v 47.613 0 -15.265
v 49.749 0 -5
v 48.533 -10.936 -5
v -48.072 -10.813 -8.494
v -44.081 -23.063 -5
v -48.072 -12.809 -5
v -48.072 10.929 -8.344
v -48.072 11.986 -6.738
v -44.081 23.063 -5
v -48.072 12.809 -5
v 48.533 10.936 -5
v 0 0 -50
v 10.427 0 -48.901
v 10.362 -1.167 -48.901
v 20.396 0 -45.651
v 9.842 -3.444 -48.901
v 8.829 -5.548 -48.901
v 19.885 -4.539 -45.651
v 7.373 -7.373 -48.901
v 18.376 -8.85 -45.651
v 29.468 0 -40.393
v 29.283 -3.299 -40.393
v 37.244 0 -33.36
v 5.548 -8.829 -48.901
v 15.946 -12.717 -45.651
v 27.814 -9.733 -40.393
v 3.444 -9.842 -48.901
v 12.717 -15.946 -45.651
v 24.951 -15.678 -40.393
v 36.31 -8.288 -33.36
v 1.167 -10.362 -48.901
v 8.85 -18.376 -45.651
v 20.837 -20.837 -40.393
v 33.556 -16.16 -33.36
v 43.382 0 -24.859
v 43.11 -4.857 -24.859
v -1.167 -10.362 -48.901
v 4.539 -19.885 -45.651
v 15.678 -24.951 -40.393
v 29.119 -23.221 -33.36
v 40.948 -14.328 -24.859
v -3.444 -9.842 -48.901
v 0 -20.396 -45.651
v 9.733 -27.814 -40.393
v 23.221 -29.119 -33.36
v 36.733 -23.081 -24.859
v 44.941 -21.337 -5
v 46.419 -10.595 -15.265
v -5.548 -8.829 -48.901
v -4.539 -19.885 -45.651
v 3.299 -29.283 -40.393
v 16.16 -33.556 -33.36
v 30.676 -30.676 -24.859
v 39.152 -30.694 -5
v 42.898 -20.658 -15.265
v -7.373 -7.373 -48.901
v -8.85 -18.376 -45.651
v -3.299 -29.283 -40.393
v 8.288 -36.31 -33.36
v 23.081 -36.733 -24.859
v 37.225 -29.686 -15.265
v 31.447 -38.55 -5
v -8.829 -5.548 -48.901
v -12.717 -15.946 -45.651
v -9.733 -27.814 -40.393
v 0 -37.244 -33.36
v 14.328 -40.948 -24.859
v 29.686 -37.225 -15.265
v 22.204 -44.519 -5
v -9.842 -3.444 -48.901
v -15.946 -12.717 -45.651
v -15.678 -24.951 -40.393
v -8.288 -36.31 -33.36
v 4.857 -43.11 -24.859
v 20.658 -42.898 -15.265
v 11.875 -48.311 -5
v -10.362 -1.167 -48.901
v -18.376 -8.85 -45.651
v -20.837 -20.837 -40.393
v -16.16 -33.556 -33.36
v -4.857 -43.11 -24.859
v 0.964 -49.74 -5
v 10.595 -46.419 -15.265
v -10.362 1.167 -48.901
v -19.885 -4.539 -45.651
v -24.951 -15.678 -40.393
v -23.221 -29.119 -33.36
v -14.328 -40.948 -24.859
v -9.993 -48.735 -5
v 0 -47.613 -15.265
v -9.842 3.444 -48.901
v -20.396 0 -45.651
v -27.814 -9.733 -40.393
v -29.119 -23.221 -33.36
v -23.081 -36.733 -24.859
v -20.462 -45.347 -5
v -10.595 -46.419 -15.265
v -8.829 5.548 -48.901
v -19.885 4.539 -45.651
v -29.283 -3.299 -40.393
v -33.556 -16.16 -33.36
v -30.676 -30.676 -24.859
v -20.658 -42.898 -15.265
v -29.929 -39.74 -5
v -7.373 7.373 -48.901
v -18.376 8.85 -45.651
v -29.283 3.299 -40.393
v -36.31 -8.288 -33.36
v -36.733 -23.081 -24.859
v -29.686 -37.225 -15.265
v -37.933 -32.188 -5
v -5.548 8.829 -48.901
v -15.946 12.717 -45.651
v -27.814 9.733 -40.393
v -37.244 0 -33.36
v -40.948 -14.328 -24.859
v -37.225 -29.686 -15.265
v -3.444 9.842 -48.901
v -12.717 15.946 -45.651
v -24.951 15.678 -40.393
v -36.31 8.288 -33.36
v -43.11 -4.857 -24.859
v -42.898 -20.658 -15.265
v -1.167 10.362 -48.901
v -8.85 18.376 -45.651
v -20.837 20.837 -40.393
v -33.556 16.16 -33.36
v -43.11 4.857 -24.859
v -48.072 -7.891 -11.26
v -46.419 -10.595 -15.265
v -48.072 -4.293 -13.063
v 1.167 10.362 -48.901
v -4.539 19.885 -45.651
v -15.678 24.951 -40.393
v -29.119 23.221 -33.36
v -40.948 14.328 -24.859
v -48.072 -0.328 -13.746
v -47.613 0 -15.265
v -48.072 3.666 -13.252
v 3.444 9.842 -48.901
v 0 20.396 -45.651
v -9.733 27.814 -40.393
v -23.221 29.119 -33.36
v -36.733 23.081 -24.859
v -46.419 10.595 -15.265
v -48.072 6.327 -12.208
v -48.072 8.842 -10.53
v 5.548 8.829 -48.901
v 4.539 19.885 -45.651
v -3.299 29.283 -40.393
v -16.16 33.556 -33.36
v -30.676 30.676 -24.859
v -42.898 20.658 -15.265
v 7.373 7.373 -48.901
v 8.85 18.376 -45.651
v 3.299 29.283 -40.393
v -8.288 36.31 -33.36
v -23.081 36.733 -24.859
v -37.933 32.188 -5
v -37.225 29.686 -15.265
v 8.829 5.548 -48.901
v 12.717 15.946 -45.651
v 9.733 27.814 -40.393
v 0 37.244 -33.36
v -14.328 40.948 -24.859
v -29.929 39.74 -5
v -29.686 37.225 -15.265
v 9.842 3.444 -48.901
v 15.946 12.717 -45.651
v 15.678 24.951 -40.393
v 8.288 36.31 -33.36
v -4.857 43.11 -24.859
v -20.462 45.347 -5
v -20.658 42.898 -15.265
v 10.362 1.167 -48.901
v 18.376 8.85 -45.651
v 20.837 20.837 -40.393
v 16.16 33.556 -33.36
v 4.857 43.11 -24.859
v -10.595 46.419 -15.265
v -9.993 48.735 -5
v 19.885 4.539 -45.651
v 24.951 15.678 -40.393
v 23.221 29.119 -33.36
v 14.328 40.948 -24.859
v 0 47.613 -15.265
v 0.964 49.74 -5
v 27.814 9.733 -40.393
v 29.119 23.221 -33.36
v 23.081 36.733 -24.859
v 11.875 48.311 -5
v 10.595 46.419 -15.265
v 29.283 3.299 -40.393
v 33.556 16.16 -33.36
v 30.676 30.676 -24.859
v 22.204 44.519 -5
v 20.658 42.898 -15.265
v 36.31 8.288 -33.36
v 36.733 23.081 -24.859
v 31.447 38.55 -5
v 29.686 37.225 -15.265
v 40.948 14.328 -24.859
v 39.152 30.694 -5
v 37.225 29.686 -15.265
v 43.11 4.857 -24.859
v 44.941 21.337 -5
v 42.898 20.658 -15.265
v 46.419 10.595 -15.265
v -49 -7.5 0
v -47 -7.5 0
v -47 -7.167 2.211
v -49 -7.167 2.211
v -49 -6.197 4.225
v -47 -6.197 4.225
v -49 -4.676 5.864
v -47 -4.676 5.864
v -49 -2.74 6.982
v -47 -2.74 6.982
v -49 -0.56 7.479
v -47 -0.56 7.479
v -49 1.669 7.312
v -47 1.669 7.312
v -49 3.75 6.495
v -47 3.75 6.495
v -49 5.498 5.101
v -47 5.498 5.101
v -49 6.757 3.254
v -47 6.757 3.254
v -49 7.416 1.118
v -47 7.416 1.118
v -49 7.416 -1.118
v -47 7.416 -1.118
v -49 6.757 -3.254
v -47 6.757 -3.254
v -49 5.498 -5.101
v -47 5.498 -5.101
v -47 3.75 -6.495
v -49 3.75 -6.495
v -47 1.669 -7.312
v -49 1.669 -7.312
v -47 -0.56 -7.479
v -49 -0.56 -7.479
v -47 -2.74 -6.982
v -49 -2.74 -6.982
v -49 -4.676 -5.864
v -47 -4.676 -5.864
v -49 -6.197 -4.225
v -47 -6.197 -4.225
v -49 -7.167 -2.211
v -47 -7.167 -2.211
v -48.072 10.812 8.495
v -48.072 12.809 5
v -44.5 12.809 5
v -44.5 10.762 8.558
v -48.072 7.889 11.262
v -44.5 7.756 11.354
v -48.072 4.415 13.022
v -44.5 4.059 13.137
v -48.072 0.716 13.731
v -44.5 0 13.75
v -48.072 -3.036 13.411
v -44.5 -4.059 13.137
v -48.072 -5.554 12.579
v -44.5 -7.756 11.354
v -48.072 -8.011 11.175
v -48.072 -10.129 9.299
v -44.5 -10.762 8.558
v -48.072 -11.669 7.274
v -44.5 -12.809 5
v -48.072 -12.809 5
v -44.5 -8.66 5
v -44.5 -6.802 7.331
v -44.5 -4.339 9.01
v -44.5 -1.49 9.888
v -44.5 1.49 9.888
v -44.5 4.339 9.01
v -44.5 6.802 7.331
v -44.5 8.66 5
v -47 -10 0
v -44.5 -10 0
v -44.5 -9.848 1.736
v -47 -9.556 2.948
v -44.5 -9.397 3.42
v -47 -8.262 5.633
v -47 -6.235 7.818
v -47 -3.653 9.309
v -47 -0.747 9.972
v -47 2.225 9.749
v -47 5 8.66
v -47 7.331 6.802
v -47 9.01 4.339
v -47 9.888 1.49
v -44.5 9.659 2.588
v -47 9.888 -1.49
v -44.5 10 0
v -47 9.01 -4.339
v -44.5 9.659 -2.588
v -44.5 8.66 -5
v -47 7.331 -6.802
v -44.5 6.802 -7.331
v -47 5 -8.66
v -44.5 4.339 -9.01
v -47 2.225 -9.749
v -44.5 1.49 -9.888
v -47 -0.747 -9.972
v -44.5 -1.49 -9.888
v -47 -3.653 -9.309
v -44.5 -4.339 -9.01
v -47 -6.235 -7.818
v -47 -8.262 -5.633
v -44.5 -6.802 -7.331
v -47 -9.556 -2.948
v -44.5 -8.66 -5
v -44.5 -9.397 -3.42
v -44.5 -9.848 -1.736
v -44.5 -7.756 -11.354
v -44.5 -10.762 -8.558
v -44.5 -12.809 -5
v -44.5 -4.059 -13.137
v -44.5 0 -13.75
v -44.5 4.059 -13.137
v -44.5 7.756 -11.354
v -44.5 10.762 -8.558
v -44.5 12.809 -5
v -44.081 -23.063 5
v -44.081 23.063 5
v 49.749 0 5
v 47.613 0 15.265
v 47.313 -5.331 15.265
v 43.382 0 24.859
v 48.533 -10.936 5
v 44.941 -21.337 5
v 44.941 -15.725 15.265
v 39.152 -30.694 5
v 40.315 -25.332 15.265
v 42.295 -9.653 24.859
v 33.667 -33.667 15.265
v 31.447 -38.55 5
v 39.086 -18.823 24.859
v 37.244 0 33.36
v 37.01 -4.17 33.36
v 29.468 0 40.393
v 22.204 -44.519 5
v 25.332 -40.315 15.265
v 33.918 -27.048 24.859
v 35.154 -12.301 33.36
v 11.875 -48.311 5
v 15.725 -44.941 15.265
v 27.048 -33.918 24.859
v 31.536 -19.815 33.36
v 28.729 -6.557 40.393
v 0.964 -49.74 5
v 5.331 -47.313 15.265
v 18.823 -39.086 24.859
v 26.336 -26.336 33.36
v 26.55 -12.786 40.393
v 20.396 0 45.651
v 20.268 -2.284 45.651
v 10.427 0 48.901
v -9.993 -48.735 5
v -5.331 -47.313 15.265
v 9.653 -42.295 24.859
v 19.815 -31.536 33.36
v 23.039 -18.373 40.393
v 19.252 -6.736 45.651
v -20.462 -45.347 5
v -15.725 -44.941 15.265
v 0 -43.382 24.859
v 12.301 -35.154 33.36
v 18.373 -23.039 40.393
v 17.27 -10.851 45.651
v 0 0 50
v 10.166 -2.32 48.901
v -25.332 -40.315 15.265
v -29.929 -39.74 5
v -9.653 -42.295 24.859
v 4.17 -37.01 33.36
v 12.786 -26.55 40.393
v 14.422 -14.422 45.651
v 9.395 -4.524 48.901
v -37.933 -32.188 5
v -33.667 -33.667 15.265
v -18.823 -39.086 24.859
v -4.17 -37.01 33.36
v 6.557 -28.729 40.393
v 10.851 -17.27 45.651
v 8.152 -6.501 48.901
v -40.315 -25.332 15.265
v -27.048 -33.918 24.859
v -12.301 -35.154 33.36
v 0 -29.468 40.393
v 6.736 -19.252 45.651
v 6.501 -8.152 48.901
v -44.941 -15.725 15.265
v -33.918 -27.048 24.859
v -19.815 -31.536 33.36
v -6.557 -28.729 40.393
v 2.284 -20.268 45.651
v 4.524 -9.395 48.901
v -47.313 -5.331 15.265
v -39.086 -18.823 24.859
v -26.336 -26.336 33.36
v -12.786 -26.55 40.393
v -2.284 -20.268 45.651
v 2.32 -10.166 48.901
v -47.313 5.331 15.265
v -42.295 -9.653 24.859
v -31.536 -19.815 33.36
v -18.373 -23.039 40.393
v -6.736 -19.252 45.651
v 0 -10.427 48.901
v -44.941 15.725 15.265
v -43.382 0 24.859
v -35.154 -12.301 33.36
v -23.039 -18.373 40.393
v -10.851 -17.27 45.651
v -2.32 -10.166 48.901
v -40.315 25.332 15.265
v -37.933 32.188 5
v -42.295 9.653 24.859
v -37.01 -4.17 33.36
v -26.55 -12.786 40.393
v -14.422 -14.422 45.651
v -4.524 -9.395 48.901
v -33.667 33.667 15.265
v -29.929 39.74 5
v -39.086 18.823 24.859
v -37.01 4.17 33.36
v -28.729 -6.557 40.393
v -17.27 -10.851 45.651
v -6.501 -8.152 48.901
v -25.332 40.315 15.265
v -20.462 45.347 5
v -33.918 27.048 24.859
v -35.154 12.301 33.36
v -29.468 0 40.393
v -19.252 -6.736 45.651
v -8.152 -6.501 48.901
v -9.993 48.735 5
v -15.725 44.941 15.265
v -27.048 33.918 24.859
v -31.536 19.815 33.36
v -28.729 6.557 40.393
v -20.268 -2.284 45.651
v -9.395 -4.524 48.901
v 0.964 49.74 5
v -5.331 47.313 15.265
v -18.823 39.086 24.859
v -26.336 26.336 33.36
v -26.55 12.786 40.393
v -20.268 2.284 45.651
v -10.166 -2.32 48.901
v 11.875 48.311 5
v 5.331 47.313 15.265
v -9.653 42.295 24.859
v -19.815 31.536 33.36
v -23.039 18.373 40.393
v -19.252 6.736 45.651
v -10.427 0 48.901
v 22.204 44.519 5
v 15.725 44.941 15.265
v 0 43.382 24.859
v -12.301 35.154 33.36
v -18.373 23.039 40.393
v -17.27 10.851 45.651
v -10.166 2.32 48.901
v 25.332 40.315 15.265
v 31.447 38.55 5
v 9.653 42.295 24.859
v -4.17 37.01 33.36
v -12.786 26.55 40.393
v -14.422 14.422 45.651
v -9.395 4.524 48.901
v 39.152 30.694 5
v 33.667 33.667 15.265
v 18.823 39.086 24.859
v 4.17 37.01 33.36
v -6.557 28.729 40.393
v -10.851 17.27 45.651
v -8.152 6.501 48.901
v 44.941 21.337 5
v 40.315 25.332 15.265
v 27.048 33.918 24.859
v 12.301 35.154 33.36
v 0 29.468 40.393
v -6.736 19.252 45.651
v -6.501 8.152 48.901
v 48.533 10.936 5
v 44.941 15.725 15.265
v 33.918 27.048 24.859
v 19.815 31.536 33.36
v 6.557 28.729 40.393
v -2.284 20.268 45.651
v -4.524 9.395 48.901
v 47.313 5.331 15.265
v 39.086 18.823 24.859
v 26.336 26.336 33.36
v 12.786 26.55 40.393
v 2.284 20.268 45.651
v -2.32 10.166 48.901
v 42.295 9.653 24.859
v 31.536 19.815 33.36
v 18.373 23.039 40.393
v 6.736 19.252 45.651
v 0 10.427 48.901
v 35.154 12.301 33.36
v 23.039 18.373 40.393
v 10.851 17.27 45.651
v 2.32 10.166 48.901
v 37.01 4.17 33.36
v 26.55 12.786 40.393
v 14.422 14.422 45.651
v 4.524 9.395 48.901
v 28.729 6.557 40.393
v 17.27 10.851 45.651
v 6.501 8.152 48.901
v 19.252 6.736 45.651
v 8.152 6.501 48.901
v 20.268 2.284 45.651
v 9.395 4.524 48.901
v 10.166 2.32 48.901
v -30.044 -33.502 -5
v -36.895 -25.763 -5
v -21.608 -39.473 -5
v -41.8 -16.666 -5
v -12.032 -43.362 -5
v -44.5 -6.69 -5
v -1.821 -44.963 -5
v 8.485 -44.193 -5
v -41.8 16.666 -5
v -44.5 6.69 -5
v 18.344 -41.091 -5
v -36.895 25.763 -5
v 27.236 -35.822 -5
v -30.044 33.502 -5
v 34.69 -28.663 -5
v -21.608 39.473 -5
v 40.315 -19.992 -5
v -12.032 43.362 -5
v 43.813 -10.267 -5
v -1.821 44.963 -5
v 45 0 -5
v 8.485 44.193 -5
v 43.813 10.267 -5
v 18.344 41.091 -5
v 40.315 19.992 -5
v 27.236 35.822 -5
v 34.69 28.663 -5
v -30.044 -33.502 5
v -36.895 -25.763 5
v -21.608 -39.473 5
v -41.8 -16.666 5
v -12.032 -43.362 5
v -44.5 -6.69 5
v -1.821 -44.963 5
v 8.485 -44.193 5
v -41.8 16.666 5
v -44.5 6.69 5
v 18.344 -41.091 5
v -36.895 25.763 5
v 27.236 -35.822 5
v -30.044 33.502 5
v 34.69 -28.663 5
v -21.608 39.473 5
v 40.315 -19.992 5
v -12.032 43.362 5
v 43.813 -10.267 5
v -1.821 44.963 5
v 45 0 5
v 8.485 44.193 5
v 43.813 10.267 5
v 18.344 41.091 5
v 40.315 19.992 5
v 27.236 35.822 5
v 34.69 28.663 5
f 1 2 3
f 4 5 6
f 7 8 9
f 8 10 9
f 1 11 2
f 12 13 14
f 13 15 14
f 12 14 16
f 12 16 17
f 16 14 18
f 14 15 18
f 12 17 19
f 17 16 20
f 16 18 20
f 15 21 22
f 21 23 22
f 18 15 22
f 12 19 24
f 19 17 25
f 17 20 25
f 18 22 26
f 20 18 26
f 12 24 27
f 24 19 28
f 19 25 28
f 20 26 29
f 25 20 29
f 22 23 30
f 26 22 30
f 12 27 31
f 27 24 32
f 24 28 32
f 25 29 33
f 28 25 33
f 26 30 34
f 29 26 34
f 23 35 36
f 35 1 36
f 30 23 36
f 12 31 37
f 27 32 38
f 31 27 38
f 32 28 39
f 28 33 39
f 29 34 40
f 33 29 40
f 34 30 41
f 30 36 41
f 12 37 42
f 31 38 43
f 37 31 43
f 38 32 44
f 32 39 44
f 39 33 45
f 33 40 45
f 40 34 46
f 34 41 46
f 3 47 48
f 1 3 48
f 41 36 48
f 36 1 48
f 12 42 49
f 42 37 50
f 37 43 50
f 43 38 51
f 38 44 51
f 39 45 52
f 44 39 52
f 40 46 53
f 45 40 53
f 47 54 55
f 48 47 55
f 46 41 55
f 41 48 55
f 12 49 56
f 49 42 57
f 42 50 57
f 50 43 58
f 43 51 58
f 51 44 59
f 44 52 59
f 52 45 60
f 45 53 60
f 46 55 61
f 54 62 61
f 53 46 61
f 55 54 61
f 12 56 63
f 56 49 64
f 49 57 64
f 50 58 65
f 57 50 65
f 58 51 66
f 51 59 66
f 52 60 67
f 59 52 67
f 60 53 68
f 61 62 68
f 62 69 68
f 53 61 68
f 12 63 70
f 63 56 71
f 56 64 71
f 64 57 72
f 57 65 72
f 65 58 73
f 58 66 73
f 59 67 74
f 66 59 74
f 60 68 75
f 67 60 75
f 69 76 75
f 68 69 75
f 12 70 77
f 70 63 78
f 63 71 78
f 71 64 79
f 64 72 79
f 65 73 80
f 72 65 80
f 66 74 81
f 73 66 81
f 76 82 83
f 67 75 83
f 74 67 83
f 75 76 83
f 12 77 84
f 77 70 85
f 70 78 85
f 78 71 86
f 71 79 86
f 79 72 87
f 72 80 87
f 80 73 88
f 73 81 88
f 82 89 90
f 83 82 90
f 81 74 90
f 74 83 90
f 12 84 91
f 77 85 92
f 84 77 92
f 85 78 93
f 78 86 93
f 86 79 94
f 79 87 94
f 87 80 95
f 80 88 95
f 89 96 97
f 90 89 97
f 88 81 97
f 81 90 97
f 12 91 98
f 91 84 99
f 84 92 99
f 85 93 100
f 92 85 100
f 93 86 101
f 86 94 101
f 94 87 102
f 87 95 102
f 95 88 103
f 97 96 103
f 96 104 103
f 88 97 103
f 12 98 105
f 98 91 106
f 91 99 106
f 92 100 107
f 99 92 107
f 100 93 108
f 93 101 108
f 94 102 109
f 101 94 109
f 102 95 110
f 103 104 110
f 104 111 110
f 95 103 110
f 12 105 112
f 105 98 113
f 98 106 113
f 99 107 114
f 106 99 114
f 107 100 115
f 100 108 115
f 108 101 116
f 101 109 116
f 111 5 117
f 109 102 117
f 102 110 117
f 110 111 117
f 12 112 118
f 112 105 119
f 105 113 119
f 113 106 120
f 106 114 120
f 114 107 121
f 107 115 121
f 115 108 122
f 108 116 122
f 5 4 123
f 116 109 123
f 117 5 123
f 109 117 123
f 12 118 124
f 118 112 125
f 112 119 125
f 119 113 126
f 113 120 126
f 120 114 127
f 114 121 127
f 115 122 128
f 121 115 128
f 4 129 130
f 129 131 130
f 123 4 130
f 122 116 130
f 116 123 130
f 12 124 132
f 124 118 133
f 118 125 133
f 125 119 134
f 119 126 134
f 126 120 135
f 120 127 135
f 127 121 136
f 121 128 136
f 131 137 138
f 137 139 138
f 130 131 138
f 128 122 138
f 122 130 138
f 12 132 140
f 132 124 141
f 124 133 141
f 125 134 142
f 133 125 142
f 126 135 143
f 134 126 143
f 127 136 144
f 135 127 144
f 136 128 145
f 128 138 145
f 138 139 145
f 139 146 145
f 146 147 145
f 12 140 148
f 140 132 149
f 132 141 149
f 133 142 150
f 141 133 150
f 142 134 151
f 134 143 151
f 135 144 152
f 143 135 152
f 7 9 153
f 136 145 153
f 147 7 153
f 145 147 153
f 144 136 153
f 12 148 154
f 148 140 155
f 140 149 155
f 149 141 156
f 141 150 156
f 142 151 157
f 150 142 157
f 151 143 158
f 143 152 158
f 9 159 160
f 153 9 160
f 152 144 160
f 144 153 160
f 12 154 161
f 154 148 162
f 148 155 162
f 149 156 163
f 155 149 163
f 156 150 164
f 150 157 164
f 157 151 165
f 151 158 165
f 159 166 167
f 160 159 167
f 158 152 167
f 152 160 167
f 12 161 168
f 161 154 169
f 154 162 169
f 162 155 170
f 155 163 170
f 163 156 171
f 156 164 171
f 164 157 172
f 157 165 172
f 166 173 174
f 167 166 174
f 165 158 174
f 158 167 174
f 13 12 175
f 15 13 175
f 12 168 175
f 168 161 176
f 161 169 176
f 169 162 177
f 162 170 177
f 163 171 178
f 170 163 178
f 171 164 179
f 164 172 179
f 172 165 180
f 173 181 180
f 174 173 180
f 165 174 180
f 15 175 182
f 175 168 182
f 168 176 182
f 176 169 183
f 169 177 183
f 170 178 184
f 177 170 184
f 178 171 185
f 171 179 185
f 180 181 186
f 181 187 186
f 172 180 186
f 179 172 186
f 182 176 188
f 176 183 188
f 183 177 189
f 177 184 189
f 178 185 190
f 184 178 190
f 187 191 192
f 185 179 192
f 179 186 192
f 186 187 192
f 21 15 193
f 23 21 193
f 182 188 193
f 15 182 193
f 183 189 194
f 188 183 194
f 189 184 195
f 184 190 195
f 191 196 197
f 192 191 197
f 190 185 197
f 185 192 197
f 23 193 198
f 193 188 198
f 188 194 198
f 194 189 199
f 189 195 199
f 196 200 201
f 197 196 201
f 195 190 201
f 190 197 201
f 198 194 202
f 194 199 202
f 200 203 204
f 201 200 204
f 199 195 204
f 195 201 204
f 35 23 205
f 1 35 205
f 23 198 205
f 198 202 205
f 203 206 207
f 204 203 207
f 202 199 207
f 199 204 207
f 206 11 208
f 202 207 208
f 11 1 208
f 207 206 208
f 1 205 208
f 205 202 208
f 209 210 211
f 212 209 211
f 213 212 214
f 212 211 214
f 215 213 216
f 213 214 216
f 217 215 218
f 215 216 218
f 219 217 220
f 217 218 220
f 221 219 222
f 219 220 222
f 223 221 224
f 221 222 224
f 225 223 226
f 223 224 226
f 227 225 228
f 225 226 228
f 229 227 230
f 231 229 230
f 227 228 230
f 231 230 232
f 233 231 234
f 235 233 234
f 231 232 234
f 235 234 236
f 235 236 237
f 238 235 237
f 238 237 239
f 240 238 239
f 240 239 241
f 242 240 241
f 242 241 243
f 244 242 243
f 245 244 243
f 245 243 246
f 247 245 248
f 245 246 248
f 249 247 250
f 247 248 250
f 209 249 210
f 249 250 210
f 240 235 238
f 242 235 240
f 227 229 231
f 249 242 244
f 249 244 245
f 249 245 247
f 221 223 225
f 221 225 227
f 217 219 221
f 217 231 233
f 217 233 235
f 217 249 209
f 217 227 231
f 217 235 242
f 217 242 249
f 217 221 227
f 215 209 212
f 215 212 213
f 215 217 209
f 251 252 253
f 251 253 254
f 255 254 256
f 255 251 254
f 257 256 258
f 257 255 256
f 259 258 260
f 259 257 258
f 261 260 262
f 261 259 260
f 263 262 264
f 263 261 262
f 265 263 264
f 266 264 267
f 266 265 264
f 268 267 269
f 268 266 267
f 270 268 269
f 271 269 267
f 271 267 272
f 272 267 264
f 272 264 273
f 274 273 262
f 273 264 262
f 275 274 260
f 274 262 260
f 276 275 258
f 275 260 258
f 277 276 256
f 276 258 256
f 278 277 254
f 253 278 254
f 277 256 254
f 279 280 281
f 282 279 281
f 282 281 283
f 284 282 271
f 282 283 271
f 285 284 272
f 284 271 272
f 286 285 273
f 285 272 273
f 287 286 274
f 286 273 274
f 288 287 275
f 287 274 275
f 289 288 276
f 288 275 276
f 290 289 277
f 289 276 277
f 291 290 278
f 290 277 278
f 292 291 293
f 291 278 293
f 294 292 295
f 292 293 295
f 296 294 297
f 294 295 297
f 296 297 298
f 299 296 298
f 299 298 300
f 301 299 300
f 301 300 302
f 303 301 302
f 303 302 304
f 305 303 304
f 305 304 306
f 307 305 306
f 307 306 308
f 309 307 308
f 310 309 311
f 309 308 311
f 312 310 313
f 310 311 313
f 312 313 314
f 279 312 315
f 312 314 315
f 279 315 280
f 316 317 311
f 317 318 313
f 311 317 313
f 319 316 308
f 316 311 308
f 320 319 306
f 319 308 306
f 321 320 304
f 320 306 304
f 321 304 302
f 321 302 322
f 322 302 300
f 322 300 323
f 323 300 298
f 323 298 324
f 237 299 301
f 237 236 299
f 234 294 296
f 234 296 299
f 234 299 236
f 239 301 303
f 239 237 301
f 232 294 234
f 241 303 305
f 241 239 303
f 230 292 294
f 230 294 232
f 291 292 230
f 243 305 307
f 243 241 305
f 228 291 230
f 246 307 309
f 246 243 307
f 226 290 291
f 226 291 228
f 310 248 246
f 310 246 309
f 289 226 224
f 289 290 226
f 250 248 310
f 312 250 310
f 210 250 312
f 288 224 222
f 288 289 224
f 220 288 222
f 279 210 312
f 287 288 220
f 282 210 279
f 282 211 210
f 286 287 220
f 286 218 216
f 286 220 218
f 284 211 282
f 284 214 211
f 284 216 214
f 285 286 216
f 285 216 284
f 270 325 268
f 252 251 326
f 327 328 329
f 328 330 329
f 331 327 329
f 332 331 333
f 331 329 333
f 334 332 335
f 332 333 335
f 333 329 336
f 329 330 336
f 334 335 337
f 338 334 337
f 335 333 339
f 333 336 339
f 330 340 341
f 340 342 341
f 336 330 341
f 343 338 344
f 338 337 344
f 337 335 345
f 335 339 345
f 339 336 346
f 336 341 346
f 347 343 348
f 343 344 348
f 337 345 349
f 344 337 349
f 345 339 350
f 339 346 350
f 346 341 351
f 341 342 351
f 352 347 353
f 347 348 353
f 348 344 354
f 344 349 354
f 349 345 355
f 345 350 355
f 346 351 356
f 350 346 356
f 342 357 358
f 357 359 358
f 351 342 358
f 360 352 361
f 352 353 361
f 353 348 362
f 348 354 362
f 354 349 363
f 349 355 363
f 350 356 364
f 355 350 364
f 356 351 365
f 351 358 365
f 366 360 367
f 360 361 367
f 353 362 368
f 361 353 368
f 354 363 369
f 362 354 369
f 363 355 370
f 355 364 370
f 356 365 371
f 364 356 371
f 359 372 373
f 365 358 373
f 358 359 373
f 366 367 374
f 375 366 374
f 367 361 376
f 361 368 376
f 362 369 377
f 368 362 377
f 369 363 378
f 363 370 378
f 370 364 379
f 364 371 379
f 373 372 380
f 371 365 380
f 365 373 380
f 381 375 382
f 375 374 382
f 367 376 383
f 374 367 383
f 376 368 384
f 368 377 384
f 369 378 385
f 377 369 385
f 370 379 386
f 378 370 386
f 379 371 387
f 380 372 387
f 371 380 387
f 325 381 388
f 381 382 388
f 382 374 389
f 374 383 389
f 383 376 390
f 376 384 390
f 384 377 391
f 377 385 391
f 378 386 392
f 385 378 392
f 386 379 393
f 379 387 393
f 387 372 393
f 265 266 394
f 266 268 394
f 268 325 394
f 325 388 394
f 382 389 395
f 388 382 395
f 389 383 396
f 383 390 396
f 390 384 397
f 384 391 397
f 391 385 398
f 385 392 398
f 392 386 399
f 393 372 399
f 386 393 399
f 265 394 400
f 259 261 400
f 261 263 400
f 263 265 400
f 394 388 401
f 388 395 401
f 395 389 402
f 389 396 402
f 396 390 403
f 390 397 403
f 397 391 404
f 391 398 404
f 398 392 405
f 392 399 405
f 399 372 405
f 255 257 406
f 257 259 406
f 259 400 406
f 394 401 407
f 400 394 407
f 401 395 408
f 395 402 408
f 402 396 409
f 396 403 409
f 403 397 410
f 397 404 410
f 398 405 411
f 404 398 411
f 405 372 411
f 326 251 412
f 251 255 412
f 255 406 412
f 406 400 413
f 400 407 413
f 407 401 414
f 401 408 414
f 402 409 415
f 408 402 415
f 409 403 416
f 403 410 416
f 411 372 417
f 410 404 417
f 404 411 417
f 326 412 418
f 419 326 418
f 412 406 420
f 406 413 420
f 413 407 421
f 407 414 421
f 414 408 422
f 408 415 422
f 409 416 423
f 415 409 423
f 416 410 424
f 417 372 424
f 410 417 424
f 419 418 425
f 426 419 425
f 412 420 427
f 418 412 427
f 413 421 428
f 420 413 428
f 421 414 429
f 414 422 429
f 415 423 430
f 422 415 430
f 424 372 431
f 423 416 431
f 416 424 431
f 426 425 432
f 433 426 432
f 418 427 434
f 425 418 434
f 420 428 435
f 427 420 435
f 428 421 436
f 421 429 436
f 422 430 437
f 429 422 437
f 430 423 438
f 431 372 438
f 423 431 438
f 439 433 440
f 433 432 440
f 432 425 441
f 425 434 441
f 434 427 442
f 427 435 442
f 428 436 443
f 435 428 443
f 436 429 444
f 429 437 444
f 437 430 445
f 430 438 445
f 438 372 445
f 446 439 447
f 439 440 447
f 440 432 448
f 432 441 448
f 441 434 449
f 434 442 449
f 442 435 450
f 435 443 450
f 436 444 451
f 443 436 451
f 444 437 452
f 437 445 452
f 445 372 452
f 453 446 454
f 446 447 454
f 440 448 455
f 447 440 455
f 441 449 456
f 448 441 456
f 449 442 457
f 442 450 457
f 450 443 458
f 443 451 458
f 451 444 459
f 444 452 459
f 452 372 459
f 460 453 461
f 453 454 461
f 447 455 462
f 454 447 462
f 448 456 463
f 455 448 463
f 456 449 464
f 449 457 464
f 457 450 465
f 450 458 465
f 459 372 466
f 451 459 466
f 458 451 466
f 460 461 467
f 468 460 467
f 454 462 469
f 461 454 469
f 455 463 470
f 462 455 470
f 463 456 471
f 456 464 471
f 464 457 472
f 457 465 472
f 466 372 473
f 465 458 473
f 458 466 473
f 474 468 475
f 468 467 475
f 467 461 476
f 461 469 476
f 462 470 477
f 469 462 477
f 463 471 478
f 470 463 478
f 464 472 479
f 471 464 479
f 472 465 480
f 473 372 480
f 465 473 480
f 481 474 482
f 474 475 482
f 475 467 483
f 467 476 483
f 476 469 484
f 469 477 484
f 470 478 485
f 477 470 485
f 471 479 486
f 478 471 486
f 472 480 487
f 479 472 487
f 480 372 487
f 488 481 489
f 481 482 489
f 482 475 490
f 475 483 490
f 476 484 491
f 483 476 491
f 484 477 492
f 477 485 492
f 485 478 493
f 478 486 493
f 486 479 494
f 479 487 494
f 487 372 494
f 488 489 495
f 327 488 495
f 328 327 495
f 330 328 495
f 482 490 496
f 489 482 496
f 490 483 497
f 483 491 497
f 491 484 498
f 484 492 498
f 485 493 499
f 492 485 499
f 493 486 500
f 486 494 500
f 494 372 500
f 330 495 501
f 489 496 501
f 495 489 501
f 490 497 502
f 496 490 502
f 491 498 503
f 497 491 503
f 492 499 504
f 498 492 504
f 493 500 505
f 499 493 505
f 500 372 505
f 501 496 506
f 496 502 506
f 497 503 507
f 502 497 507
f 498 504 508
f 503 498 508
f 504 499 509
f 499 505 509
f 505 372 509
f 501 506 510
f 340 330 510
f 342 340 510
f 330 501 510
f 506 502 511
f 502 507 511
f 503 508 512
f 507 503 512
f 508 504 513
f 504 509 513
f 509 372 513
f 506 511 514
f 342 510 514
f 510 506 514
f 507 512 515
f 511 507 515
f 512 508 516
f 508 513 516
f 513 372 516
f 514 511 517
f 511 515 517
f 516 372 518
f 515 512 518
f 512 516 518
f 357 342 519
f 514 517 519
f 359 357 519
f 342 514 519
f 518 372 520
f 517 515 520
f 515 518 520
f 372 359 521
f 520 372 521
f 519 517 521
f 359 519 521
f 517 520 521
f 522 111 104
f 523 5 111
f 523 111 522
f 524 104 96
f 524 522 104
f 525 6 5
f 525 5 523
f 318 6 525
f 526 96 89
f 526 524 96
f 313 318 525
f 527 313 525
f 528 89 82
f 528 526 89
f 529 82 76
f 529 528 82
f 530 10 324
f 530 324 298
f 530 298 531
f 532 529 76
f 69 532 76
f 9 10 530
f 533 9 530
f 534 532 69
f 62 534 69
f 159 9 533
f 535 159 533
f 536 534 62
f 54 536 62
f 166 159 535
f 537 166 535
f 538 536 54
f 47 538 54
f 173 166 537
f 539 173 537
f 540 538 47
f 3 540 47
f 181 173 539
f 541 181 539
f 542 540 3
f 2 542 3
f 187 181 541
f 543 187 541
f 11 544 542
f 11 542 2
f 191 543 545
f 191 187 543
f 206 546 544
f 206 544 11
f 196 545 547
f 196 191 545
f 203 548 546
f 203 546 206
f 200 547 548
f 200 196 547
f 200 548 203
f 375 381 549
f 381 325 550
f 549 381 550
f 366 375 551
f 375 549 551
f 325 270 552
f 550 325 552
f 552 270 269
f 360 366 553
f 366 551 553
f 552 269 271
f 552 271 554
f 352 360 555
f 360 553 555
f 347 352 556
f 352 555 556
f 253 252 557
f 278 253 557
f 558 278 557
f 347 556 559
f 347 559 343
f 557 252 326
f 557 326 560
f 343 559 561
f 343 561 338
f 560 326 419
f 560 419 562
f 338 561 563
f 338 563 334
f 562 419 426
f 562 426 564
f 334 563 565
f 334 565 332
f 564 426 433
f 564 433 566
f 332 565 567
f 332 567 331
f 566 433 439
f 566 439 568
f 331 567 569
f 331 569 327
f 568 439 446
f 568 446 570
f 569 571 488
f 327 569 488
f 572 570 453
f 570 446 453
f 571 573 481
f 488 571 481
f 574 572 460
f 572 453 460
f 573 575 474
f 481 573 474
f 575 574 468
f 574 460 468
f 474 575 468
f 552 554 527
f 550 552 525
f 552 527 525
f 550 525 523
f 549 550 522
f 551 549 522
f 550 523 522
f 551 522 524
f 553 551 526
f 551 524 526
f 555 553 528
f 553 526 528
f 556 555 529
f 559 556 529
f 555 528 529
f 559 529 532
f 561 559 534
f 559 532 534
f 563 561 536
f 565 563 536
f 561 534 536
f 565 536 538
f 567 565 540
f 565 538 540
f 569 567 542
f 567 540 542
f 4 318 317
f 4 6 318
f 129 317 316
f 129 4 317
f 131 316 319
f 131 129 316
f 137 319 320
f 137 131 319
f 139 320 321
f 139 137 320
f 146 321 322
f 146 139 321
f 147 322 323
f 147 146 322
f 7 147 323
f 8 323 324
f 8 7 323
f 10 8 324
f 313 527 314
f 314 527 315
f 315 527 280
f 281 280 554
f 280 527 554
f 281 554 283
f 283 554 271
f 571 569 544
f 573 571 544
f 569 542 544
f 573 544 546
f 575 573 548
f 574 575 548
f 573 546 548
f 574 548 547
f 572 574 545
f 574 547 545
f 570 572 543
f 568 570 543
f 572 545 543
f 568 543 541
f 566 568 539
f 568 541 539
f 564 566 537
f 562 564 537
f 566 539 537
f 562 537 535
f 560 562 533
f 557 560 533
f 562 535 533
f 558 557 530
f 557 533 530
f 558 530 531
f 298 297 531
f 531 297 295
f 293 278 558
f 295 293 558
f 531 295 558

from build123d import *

# Parameters (mm, degrees)
F2_R      = 50
F2_R_2    = 45
F3_DEPTH  = 5
F5_R      = 13.75
F6_DEPTH  = 5.5
F7_R      = 10
F8_DEPTH  = 2.5
F9_R      = 7.5
F10_DEPTH = 2


with BuildPart() as f1:
    # F0 (on Front) → F1 (revolve)
    with BuildSketch(Plane.XZ):
        with BuildLine():
            Line((0, 50), (0, -50))
            ThreePointArc((0, -50), (50, 0), (0, 50))
        make_face()
    revolve(axis=Axis((0, 0, 0), (0, 0, -1)))

    # F2 (on Top) → F3 (cut, symmetric)
    with BuildSketch(Plane.XY):
        Circle(F2_R)
        Circle(F2_R_2, mode=Mode.SUBTRACT)
    extrude(amount=F3_DEPTH, both=True, mode=Mode.SUBTRACT)

    # F5 (on offset) → F6 (cut)
    with BuildSketch(Plane.YZ.offset(-50)):
        Circle(F5_R)
    extrude(amount=F6_DEPTH, mode=Mode.SUBTRACT)

    # F7 (on face) → F8 (join)
    with BuildSketch(Plane(origin=(-44.5, 0, 0), x_dir=(0, -1, 0), z_dir=(-1, 0, 0))):
        Circle(F7_R)
    extrude(amount=F8_DEPTH)

    # F9 (on face) → F10 (join)
    with BuildSketch(Plane(origin=(-47, 0, 0), x_dir=(0, -1, 0), z_dir=(-1, 0, 0))):
        Circle(F9_R)
    extrude(amount=F10_DEPTH)


solid = f1.part
